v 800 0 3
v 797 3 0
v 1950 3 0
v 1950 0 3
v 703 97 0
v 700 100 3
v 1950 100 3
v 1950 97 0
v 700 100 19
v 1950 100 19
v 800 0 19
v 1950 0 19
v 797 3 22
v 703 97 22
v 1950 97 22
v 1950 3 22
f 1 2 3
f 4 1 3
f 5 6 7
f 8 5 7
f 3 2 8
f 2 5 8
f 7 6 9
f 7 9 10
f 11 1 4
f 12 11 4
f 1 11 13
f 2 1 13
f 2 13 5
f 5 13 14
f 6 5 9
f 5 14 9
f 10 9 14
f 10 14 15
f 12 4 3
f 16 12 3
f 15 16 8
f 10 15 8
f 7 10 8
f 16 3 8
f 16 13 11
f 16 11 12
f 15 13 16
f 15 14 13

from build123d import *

# Parameters (mm, degrees)
ESQUISSE1_W                  = 1950
ESQUISSE1_H                  = 100
BOSS_EXTRU_1_DEPTH           = 22
ENL_V_MAT_EXTRU_1_DEPTH      = 1953.686354743
ENL_V_MAT_EXTRU_1_DEPTH_BACK = 1953.686354743
CHANFREIN1_SIZE              = 3


with BuildPart() as part:
    # Esquisse1 → Boss.-Extru.1 (new body)
    with BuildSketch(Plane.XY):
        with Locations((975, 50)):
            Rectangle(ESQUISSE1_W, ESQUISSE1_H)
    extrude(amount=BOSS_EXTRU_1_DEPTH)

    # Esquisse2 → Enlèv. mat.-Extru.1 (cut, two sides: drawn at the far end of the back side and taken through both)
    with BuildSketch(Plane(origin=(0, 0, 0), x_dir=(-1, 0, 0), z_dir=(0, 0, -1)).offset(-ENL_V_MAT_EXTRU_1_DEPTH_BACK)):
        Polygon((0, 0), (-800, 0), (-700, 100), (0, 100), align=None)
    extrude(amount=ENL_V_MAT_EXTRU_1_DEPTH + ENL_V_MAT_EXTRU_1_DEPTH_BACK, mode=Mode.SUBTRACT)

    # Chanfrein1
    chanfrein1_edges = [part.edges().sort_by_distance(p)[0] for p in [
        (1325, 100, 22),
        (1375, 0, 0),
        (1375, 0, 22),
        (1325, 100, 0),
    ]]
    chamfer(chanfrein1_edges, length=CHANFREIN1_SIZE)


solid = part.part
